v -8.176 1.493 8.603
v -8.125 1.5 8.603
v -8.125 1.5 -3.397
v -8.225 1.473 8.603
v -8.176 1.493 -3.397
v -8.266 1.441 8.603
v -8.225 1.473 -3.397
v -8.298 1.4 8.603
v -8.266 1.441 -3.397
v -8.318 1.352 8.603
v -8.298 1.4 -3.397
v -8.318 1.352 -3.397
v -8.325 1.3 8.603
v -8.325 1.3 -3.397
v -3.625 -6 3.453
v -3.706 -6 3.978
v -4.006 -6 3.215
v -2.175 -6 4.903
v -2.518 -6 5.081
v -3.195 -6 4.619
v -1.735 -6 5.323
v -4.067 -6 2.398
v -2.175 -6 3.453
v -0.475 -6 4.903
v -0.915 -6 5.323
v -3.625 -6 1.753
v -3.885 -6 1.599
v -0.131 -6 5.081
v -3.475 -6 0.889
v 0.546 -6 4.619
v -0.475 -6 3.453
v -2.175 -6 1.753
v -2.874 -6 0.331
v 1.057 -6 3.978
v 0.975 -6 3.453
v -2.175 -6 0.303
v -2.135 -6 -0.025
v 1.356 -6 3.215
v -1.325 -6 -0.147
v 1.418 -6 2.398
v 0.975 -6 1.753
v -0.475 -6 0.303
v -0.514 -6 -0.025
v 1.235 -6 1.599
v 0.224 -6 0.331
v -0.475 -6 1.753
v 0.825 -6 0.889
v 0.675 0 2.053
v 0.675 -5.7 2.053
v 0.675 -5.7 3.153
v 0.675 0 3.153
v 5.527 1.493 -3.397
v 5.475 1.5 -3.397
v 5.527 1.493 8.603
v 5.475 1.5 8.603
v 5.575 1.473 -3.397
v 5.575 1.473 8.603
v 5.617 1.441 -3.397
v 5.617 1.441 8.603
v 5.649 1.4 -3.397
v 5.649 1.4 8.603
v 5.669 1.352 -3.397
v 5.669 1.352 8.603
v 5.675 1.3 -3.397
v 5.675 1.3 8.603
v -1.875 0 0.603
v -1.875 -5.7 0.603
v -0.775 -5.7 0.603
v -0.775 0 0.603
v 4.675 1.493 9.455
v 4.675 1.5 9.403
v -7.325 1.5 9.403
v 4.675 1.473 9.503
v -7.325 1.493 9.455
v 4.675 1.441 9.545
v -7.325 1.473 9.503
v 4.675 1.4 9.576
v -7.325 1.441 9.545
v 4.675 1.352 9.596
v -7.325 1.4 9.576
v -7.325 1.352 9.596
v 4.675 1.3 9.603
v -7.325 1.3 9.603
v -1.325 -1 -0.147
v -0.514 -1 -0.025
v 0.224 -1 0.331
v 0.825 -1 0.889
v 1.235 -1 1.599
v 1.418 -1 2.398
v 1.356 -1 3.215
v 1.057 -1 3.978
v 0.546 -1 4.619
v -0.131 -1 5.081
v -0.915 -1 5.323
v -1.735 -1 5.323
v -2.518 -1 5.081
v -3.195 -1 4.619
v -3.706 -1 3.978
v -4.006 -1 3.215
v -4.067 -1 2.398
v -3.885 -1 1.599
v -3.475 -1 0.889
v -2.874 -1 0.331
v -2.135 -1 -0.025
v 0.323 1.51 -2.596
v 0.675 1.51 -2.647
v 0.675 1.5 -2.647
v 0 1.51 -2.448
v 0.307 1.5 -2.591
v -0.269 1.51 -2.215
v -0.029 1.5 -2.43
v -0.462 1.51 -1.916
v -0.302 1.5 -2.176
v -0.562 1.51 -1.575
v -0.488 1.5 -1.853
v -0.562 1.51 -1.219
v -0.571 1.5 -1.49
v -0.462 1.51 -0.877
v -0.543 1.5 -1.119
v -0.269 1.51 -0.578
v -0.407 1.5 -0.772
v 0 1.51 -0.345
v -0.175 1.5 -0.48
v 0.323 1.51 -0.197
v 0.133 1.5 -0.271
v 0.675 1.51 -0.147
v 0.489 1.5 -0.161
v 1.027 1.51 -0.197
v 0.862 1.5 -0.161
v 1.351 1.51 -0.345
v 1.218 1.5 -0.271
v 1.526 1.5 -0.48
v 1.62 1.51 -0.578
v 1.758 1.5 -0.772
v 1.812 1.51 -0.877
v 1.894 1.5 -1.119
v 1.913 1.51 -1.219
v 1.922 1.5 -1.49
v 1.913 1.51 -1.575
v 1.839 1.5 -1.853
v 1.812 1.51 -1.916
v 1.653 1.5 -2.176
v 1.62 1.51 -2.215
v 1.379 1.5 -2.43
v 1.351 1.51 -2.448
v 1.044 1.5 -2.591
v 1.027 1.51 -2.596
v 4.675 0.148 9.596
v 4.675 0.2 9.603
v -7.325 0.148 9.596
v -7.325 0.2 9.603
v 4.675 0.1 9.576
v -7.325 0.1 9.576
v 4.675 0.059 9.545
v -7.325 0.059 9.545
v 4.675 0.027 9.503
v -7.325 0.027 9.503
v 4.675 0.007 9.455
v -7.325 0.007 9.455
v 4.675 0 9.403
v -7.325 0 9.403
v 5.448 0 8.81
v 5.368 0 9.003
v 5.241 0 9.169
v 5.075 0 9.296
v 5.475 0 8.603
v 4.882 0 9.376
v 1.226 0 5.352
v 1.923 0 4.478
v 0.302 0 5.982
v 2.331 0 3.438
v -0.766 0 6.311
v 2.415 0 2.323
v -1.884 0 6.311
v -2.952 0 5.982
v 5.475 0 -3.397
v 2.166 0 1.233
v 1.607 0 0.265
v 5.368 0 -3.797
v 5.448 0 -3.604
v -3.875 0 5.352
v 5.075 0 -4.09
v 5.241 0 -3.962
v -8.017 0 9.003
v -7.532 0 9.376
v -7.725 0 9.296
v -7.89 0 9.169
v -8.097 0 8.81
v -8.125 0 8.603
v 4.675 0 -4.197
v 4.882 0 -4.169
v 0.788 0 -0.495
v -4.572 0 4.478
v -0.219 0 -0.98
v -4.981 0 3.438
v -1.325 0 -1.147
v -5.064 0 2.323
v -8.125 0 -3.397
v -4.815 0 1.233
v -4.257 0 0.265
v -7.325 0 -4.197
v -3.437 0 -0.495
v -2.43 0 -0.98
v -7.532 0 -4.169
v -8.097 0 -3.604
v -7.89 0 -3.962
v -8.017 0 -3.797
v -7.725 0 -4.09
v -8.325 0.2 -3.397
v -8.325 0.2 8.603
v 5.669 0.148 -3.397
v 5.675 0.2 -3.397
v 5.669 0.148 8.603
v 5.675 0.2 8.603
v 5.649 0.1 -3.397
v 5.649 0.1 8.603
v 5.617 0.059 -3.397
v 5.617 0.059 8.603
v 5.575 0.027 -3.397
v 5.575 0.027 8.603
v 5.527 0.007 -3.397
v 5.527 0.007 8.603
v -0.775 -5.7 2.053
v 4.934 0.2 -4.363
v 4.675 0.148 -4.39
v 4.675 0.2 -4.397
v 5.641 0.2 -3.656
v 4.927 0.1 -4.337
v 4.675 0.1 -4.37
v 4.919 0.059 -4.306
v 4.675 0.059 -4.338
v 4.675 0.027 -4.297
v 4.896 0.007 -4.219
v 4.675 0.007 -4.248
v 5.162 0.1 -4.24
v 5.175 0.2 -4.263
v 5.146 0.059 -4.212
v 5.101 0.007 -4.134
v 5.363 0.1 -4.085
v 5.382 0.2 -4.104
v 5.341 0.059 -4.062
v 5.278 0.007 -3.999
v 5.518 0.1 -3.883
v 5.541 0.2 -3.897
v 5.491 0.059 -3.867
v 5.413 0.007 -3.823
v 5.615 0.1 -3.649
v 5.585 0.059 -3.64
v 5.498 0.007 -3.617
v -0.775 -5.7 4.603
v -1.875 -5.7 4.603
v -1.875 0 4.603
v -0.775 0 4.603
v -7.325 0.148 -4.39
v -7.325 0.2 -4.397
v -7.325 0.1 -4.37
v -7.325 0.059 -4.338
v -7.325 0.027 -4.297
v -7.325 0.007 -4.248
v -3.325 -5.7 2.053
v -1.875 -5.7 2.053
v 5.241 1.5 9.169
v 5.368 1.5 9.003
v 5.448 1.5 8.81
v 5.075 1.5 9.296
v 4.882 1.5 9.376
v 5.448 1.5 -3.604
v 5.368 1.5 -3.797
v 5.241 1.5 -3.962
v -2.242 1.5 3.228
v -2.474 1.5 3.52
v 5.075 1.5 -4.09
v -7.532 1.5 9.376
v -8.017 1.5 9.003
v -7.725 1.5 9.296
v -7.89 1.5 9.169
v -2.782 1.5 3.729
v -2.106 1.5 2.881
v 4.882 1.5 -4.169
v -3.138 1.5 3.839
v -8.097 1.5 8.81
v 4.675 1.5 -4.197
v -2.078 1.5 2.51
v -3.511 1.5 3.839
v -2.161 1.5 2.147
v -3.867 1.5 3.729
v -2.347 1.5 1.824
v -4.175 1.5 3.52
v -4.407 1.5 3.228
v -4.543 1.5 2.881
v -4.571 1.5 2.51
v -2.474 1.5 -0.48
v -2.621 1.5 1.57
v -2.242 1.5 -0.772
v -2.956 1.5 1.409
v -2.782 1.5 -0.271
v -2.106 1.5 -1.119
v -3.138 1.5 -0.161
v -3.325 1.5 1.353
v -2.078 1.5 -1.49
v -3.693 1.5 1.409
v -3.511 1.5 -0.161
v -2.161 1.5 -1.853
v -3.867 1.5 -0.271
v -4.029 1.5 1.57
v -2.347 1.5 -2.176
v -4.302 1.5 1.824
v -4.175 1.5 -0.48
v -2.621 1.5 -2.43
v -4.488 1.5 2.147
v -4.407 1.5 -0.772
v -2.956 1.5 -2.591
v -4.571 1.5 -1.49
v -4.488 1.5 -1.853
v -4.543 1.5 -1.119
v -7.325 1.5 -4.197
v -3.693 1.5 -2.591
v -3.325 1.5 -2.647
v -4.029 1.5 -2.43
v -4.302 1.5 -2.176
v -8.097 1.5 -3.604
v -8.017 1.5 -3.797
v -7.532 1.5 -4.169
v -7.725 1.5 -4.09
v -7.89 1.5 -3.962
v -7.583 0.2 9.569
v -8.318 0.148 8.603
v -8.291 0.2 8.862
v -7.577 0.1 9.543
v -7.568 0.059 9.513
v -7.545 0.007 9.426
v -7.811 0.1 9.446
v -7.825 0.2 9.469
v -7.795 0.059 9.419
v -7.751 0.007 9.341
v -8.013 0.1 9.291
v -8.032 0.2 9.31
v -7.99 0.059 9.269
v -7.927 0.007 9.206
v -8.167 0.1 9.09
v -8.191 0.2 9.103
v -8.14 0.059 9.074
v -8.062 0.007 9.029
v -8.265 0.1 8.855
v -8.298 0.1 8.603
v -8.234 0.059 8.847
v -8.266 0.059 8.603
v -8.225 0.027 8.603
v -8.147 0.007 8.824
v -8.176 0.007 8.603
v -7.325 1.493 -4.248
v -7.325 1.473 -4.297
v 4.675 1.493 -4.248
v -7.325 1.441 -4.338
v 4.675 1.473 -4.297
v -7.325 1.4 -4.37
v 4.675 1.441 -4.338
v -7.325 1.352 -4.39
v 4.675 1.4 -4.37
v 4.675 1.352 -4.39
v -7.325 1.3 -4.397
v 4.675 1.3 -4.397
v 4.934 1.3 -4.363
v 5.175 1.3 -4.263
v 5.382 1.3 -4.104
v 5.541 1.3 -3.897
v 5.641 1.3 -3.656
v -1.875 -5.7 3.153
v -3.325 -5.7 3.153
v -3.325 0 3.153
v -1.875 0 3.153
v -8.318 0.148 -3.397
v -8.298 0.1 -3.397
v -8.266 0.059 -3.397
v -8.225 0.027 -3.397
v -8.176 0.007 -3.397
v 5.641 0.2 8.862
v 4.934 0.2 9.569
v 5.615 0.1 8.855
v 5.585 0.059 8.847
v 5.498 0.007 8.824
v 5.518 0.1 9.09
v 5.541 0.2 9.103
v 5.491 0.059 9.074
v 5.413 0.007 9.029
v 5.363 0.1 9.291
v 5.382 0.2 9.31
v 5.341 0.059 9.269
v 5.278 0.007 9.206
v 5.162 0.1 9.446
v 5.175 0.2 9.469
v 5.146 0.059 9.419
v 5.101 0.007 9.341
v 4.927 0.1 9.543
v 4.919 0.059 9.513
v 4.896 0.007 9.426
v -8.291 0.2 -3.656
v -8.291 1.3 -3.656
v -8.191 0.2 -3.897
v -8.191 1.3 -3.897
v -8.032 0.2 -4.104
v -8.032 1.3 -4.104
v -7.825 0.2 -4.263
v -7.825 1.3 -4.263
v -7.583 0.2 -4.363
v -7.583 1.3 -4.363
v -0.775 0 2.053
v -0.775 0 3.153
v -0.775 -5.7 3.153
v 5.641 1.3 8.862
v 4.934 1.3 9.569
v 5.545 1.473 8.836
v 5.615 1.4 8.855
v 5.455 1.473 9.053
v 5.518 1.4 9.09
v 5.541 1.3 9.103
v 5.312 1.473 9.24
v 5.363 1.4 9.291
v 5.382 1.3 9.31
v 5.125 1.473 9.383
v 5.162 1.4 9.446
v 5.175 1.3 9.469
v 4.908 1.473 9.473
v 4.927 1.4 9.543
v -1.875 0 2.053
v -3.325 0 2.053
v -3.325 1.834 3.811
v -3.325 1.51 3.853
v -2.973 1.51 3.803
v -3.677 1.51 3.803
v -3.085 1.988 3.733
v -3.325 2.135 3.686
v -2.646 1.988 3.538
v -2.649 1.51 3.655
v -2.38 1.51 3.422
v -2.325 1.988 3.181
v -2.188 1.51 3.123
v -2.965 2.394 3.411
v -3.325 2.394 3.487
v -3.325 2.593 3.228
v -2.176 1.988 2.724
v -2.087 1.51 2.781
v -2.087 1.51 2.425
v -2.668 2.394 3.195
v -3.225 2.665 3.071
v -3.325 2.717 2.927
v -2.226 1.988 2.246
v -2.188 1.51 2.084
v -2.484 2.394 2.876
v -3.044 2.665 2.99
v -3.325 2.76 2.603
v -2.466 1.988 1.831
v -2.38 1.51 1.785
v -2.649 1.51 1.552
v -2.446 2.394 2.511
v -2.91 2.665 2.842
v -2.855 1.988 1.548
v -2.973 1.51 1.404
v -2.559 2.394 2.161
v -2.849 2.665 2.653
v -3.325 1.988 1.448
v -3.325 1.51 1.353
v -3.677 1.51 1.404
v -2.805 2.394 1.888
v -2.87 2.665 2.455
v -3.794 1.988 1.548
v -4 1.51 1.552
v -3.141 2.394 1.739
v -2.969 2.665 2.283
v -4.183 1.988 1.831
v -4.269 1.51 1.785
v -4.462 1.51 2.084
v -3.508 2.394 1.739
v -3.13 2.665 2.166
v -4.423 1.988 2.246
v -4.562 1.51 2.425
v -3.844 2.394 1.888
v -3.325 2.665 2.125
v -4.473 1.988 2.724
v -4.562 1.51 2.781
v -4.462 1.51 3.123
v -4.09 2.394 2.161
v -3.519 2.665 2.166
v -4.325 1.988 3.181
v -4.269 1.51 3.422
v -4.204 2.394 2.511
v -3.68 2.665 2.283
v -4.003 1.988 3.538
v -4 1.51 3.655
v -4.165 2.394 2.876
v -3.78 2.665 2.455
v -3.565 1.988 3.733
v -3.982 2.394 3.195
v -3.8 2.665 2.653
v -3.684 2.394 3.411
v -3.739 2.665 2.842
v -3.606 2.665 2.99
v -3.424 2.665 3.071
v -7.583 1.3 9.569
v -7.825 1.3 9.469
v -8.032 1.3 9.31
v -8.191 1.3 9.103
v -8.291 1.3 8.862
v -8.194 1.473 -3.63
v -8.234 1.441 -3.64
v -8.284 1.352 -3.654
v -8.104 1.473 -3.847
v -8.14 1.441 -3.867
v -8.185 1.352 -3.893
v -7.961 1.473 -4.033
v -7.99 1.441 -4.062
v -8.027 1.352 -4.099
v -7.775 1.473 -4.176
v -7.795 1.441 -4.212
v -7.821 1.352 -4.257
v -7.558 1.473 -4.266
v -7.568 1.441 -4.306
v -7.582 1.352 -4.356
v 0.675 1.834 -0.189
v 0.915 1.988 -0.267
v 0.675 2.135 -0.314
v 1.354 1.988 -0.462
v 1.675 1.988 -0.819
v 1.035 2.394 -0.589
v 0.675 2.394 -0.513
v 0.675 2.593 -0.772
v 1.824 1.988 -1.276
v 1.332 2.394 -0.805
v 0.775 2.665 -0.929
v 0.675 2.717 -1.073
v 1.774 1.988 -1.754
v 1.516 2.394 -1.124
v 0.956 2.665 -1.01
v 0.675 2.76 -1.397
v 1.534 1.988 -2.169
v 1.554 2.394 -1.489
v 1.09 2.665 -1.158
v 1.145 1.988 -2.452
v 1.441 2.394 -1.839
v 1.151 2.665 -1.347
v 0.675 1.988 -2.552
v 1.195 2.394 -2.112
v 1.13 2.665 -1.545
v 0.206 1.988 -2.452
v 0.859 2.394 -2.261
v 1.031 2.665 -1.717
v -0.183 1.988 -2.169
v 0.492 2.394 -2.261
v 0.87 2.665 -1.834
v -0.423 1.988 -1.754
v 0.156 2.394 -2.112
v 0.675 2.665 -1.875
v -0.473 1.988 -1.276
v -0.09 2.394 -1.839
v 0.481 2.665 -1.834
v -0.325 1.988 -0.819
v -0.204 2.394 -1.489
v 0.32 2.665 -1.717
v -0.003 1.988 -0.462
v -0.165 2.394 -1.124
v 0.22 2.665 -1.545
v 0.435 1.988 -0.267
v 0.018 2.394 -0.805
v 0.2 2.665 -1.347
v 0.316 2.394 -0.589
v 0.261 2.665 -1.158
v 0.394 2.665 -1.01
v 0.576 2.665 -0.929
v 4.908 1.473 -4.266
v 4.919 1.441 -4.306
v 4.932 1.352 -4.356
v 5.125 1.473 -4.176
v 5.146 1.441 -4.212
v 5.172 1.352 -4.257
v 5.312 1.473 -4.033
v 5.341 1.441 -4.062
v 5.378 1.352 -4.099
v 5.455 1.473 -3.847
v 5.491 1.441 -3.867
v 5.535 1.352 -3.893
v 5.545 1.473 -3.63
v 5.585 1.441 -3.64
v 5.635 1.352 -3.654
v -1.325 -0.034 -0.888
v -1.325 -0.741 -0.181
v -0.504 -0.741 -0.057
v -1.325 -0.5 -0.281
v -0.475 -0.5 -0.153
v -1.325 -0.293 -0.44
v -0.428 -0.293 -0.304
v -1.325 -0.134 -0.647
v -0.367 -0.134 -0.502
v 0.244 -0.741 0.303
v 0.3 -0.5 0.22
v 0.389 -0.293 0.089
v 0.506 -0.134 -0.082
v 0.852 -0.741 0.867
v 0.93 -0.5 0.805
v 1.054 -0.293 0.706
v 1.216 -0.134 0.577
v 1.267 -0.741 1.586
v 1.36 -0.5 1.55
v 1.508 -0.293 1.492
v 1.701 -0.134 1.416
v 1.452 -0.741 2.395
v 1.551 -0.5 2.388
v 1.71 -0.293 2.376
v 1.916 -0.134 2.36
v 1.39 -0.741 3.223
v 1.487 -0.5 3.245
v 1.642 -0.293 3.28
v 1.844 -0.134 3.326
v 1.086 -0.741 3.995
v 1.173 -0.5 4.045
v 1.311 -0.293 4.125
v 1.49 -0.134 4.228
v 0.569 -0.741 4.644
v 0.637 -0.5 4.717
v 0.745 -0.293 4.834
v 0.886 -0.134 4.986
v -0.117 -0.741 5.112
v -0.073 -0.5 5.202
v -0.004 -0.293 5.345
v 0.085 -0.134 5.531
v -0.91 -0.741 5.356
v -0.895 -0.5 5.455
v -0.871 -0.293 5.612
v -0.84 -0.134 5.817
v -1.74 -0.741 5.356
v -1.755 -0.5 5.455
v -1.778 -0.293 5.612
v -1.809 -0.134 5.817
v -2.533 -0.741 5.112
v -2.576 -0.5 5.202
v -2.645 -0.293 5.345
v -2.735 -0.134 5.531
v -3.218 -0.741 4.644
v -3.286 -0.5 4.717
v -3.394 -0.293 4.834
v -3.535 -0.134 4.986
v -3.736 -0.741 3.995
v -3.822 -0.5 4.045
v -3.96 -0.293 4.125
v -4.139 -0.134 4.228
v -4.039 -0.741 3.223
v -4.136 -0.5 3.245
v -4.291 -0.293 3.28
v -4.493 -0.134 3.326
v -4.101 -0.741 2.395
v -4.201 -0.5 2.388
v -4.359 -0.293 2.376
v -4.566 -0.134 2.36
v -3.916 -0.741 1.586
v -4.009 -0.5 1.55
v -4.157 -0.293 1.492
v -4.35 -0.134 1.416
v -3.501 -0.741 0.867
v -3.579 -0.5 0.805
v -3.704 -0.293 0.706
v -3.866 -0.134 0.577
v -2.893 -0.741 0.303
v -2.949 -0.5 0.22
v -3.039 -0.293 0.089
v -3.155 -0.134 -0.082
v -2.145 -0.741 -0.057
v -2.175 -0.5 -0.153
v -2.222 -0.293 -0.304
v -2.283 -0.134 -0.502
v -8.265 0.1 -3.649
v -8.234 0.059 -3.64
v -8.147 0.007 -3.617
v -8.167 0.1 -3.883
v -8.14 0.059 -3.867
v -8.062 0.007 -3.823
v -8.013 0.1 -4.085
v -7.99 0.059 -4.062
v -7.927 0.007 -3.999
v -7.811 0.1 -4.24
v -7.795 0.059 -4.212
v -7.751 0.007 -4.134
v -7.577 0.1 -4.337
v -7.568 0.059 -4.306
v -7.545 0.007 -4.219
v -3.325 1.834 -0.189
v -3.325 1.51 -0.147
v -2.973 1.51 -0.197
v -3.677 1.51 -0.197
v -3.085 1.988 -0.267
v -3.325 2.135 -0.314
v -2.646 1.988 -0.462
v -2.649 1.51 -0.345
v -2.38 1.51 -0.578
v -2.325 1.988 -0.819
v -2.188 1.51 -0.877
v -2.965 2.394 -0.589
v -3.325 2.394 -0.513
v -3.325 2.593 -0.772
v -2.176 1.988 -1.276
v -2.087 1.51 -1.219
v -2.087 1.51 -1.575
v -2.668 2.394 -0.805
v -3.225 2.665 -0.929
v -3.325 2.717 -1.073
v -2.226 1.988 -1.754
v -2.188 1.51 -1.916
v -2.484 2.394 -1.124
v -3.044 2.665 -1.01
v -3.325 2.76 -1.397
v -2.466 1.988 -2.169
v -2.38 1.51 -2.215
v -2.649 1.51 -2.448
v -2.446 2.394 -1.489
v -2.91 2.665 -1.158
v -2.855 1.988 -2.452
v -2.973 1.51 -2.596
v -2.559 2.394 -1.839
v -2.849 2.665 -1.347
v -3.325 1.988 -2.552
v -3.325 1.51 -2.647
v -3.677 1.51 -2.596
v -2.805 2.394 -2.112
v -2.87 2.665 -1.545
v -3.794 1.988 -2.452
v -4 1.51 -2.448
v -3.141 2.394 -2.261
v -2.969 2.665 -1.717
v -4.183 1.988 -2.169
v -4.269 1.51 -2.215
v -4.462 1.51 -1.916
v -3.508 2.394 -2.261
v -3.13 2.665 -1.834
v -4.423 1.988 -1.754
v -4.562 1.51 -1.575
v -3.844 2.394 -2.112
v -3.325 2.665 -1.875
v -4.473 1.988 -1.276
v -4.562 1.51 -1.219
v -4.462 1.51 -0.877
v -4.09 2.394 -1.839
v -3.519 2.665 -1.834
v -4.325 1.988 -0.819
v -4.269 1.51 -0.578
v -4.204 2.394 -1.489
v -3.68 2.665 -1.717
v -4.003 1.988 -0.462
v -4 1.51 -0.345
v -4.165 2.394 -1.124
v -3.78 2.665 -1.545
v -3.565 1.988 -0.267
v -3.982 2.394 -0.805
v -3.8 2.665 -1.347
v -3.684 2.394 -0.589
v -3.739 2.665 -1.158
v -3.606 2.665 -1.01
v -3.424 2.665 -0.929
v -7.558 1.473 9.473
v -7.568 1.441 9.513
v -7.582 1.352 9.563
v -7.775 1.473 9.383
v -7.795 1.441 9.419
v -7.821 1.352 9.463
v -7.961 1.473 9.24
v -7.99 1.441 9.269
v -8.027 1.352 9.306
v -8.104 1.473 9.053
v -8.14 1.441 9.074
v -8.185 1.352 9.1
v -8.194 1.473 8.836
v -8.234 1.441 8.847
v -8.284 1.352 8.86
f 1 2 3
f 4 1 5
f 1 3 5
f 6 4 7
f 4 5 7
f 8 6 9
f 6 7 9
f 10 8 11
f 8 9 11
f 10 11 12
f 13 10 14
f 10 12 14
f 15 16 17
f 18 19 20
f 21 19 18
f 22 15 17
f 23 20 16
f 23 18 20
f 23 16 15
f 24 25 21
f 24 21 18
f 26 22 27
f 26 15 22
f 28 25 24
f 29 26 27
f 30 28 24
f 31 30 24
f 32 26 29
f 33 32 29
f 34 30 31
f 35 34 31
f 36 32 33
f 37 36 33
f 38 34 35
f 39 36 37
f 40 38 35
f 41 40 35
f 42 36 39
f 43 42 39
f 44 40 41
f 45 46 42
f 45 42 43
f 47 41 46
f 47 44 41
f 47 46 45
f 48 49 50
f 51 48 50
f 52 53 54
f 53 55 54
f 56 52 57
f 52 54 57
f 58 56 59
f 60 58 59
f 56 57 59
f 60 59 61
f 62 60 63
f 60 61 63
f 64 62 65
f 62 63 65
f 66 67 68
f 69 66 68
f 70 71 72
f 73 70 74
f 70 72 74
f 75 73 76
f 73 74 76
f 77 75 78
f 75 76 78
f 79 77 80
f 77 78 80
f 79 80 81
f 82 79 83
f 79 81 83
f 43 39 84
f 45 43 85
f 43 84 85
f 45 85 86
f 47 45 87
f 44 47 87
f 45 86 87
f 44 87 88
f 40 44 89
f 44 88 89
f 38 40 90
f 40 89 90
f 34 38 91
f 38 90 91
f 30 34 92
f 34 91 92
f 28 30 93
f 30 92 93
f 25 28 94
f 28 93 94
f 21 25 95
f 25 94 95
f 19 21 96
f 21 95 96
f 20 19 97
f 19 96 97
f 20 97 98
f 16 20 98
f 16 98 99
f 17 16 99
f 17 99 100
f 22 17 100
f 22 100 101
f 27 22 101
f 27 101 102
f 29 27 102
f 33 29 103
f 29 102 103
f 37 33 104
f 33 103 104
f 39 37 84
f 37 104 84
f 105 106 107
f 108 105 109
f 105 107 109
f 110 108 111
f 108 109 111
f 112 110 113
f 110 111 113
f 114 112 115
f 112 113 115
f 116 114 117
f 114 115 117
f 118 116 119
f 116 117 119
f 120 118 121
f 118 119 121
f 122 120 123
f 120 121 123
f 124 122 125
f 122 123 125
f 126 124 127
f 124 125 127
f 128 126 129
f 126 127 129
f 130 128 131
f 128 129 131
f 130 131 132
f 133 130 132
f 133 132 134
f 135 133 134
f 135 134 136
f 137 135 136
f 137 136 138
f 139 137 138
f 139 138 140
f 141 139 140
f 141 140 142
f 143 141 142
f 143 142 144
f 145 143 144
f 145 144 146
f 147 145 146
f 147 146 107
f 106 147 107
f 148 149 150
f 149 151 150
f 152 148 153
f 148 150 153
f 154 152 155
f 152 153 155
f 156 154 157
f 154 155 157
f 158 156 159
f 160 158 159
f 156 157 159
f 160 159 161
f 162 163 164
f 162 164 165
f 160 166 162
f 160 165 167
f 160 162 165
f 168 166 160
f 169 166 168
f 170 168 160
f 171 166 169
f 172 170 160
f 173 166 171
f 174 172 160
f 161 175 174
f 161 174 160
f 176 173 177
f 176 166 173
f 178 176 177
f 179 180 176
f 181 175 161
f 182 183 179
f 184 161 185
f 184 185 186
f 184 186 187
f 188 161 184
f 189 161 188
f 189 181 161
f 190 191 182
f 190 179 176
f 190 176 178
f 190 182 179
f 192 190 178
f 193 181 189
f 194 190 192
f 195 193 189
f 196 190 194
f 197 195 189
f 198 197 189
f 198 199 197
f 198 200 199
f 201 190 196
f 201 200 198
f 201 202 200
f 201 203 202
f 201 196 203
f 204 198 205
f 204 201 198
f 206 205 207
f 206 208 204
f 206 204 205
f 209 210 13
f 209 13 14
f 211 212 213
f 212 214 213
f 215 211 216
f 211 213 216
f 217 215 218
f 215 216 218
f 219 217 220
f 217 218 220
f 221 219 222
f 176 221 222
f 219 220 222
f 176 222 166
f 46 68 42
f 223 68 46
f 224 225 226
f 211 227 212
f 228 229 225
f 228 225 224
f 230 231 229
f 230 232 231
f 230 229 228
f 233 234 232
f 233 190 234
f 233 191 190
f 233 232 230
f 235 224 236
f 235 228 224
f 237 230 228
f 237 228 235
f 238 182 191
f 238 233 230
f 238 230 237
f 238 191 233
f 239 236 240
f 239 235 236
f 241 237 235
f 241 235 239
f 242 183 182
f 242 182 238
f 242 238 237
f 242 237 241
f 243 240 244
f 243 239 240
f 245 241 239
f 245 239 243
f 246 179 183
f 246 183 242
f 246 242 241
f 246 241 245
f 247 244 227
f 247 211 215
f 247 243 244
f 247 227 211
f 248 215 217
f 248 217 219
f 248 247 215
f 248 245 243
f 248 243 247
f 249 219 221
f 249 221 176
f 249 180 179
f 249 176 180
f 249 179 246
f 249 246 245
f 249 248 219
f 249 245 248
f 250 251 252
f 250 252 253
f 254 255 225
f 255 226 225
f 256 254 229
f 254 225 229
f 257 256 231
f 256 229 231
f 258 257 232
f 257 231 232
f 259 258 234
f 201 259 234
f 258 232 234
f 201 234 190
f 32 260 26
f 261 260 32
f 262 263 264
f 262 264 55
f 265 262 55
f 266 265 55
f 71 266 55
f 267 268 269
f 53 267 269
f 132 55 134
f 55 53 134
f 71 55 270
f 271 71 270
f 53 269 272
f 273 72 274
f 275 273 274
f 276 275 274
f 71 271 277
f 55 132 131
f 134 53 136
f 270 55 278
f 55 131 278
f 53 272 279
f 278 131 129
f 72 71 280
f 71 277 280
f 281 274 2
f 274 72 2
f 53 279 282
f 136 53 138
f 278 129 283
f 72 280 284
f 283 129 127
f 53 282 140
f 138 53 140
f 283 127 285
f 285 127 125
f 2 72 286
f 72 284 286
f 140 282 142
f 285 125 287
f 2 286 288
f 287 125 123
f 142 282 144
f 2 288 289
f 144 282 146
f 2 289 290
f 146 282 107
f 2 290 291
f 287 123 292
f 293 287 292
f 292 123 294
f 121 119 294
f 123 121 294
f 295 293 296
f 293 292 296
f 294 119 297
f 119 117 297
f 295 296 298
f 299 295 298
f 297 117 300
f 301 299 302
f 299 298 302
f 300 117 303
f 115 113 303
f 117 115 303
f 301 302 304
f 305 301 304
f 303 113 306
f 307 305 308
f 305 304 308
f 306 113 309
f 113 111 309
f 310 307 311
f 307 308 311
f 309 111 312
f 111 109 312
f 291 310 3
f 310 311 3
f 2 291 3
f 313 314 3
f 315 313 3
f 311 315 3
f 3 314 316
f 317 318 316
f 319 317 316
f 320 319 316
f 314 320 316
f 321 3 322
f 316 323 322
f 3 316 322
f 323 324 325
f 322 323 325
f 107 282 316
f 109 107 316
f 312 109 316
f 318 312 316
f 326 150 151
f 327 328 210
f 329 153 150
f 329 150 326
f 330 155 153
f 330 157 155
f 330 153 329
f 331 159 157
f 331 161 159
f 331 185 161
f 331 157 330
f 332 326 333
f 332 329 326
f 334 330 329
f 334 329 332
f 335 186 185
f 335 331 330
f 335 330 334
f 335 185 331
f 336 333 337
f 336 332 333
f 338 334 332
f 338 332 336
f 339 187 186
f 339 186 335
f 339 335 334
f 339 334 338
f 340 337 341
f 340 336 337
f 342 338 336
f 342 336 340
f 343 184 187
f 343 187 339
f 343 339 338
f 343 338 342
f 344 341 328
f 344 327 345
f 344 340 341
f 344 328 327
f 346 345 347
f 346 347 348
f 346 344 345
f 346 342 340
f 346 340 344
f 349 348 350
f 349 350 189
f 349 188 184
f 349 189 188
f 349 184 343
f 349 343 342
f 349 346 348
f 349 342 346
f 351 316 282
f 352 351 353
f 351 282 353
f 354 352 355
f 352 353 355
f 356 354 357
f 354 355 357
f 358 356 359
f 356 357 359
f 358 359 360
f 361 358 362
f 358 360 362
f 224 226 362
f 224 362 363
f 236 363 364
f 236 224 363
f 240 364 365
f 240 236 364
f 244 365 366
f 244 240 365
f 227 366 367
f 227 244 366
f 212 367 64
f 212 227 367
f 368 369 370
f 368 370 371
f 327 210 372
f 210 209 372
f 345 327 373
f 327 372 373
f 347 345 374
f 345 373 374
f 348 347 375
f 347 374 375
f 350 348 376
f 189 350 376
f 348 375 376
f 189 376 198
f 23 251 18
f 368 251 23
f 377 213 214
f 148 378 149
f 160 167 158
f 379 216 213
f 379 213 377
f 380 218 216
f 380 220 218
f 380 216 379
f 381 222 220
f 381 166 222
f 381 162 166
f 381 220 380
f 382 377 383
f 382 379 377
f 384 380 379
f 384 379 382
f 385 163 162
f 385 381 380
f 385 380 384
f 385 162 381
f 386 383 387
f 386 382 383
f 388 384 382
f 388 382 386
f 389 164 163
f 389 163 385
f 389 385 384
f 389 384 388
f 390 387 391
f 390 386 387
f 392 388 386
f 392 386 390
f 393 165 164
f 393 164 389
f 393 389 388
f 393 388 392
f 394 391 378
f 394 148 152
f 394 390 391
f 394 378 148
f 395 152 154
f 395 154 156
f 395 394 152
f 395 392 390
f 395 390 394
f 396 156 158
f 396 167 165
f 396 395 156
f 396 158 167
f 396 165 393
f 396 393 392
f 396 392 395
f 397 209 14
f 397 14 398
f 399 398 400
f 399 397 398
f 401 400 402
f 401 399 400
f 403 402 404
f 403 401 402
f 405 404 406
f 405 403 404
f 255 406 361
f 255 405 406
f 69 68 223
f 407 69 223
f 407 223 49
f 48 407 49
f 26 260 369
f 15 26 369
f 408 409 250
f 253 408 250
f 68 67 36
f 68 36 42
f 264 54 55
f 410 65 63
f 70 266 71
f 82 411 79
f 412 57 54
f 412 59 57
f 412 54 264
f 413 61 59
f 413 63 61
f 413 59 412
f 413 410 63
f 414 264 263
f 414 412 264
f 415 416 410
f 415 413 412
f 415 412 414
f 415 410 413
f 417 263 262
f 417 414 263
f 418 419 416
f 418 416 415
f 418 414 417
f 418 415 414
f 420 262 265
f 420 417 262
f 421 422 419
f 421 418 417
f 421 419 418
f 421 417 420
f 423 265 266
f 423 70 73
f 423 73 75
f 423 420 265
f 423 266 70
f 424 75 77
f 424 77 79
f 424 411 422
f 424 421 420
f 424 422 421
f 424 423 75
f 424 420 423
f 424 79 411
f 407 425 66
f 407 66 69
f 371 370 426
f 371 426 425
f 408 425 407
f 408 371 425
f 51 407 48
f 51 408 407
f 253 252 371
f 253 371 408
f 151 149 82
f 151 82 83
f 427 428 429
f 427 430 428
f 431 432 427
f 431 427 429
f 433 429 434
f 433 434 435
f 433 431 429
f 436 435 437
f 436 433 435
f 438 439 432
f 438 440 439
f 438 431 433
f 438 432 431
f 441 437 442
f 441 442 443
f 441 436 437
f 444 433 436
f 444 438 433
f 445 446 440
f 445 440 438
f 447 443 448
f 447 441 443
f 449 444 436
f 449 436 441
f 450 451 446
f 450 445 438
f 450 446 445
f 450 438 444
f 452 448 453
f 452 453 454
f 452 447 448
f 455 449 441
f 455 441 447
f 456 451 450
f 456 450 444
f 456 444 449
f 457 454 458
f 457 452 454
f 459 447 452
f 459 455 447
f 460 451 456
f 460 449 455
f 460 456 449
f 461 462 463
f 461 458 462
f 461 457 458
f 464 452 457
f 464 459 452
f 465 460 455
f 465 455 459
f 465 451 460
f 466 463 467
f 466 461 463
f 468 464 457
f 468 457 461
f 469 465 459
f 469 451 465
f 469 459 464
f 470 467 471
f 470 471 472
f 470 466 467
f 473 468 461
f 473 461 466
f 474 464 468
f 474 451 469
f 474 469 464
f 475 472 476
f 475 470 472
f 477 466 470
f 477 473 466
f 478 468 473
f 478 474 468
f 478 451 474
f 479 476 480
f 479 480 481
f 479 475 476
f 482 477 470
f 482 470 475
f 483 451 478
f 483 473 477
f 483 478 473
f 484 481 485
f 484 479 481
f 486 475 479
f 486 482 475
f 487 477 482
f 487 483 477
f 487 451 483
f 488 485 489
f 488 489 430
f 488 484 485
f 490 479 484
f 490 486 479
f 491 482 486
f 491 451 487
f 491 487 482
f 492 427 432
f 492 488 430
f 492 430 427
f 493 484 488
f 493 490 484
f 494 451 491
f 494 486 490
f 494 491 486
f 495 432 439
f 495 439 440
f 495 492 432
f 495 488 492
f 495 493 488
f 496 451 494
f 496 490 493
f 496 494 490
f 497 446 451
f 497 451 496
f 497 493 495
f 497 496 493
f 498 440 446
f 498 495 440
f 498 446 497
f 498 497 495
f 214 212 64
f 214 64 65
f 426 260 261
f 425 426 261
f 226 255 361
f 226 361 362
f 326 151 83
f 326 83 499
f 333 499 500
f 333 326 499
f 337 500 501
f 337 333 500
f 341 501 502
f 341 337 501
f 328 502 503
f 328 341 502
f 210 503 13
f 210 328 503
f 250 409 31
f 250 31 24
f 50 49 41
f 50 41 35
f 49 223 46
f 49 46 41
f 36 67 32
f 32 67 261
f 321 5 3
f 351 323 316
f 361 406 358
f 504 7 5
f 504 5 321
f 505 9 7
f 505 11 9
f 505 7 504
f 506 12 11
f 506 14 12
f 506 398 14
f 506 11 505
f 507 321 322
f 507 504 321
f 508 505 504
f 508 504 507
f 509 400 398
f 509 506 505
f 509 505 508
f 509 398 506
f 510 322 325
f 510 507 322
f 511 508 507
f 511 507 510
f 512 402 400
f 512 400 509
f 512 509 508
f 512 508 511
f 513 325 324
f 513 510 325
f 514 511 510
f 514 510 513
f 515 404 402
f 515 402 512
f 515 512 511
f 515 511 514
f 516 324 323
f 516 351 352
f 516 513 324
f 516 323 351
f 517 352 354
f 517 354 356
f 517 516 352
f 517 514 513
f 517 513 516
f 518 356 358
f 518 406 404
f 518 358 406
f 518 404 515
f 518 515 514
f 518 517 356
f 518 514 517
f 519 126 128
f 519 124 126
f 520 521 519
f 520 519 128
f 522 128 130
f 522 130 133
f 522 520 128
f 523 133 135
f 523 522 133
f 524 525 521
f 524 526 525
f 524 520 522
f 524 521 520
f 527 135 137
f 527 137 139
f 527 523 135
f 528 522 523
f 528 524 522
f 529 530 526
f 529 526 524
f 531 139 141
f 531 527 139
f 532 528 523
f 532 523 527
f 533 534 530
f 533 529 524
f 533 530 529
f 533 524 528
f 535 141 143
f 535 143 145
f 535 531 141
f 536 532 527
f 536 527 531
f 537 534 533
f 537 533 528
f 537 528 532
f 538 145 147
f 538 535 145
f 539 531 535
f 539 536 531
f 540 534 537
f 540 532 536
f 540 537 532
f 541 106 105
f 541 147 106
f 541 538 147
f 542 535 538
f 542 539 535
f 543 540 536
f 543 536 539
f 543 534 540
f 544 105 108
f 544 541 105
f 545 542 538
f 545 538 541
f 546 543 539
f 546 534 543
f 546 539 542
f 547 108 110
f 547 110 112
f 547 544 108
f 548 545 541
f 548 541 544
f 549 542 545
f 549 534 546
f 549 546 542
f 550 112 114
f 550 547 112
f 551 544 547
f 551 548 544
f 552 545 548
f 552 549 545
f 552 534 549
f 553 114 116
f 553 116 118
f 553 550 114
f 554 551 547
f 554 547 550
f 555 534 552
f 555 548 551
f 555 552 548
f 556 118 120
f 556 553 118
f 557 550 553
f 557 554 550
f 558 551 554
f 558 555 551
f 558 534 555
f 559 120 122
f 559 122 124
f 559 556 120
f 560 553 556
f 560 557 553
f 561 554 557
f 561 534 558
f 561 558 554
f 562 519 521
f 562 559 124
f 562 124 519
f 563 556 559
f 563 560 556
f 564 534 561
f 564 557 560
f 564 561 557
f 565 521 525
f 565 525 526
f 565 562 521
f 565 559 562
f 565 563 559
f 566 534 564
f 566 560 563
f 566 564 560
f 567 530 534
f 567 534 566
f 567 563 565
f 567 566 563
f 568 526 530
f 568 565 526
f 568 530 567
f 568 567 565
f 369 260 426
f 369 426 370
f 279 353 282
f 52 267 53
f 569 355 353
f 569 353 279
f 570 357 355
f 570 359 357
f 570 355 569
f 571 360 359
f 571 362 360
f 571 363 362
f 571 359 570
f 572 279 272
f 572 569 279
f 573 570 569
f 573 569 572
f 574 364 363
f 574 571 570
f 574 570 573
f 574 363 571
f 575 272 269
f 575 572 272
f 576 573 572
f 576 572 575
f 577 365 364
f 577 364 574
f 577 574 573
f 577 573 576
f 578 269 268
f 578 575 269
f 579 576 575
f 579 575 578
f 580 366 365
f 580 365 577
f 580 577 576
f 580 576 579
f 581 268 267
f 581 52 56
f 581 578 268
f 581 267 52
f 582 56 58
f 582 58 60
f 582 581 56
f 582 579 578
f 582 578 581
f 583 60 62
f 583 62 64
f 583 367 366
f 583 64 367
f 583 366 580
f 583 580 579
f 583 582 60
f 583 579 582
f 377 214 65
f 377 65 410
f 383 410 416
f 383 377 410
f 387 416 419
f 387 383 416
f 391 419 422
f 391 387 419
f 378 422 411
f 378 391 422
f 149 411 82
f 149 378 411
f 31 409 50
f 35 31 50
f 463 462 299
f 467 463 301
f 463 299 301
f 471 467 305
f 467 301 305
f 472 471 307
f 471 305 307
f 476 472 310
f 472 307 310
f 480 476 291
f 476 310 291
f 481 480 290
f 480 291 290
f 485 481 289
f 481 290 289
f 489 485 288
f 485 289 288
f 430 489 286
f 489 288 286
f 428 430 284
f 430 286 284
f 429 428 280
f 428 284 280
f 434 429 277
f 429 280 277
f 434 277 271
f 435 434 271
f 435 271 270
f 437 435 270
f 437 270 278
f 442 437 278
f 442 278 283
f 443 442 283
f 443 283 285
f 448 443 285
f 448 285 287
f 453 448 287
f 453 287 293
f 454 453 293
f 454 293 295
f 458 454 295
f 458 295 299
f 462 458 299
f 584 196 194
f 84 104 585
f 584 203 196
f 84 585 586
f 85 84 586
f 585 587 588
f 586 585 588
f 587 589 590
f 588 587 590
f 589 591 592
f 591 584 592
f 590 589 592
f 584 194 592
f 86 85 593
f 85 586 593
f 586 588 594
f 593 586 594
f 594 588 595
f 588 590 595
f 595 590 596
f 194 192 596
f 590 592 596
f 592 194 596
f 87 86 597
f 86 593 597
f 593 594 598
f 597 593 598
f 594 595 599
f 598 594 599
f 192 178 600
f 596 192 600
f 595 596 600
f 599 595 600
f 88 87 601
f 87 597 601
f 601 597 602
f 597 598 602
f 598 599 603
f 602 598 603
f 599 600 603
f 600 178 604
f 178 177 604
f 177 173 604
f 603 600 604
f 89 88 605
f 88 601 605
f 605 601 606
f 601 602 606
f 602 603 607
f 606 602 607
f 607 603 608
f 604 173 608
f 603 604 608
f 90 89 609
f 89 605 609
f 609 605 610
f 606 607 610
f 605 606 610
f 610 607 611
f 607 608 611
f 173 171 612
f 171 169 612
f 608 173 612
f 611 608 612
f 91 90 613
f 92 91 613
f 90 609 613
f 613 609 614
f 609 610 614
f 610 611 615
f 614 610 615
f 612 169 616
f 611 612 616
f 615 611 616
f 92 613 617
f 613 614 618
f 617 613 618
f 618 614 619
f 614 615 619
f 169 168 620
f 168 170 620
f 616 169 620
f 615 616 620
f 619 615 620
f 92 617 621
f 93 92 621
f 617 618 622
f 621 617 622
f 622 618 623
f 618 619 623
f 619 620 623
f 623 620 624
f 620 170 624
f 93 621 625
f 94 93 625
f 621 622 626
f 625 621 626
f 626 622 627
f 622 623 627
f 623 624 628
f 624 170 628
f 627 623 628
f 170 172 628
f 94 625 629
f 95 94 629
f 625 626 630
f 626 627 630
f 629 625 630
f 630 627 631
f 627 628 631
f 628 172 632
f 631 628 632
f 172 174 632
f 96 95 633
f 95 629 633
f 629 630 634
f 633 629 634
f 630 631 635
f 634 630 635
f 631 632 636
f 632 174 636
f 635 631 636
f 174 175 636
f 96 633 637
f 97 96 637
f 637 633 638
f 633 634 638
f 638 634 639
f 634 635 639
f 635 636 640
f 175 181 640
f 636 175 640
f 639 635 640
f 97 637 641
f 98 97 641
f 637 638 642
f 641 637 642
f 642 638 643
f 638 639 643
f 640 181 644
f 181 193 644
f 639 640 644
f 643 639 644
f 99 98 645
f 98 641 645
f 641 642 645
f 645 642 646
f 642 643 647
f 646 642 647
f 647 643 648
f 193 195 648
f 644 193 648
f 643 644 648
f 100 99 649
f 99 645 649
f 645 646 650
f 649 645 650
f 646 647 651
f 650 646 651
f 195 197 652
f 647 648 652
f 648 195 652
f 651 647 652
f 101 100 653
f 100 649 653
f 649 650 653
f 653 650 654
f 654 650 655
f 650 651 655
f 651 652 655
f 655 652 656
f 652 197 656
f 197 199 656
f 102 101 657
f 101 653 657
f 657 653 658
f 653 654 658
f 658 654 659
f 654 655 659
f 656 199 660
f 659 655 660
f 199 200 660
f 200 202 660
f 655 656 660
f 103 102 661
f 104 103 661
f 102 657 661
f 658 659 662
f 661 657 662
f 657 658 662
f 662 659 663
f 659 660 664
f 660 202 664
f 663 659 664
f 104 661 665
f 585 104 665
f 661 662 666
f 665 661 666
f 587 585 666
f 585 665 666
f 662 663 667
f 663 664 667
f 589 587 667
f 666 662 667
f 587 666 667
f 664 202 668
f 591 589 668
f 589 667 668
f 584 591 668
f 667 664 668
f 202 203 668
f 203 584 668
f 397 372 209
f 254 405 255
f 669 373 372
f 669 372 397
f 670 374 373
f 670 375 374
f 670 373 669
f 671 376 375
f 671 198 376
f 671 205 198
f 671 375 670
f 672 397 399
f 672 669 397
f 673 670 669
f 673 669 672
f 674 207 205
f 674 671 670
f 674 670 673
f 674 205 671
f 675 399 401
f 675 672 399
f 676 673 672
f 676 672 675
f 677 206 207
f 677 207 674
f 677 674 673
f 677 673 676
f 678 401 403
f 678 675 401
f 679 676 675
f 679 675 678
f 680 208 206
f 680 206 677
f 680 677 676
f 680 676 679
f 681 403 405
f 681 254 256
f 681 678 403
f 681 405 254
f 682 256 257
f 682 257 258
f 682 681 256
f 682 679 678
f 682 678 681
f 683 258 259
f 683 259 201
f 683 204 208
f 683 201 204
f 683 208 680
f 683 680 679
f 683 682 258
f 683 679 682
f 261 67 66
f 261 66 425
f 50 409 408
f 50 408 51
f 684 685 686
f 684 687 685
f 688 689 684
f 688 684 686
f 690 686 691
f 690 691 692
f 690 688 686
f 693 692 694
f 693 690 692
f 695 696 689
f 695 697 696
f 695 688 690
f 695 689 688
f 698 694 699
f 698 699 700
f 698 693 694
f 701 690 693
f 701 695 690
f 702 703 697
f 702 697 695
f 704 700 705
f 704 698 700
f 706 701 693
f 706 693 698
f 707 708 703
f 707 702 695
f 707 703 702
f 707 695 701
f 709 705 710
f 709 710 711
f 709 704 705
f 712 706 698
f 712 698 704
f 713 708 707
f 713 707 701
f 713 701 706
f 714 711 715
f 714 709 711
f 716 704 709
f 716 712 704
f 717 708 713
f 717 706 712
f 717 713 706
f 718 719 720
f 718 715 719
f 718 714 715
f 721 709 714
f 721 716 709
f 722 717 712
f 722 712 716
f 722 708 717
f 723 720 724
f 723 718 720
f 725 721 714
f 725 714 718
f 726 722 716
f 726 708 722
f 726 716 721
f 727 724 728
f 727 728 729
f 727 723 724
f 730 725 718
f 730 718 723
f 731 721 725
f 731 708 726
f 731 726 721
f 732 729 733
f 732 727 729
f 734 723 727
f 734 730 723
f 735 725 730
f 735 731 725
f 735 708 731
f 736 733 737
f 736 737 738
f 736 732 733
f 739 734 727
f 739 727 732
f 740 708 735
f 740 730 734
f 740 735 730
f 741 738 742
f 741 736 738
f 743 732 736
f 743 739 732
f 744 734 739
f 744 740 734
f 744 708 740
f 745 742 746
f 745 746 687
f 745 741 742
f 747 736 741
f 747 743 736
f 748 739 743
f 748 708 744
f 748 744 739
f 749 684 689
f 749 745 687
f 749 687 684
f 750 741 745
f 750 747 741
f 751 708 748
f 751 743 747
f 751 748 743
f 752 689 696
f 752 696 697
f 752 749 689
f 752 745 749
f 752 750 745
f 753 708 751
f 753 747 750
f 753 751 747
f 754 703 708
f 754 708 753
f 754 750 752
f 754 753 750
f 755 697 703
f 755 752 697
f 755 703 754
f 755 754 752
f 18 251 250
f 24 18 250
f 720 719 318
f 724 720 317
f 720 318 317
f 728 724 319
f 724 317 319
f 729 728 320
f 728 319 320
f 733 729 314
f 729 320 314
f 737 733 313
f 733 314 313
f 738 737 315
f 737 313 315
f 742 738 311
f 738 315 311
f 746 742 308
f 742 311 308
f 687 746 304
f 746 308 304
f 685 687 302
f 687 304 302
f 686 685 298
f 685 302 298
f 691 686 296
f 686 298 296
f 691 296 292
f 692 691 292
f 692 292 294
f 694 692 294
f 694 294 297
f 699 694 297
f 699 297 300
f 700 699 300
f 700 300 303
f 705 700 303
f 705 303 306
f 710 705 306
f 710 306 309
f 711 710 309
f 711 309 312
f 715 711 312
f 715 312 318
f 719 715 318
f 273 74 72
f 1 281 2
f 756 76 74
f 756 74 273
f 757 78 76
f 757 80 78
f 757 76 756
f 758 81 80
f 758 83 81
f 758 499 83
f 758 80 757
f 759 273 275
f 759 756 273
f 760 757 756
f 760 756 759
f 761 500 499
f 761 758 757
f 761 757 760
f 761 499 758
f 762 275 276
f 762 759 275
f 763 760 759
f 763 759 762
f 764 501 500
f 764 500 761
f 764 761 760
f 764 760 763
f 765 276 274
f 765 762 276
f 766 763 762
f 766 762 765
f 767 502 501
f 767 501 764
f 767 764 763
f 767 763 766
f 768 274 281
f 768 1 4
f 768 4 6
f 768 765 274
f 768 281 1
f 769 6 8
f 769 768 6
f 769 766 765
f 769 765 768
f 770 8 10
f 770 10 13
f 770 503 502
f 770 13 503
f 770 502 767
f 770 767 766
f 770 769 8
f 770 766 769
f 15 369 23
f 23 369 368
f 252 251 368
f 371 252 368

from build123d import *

# Parameters (mm, degrees)
BOSS_EXTRUDE1_DEPTH = 1.5
SKETCH2_R           = 2.75
BOSS_EXTRUDE2_DEPTH = 6
SKETCH3_W           = 1.1
SKETCH3_H           = 1.45
SKETCH3_W_2         = 1.45
SKETCH3_H_2         = 1.1
CUT_EXTRUDE1_DEPTH  = 6
CHAMFER1_SIZE       = 0.3
FILLET1_R           = 1
SKETCH4_R           = 1.25
BOSS_EXTRUDE3_DEPTH = 0.01
DOME1_FACE_RADIUS   = 1.25
DOME1_HEIGHT        = 1.25
DOME2_FACE_RADIUS   = 1.25
DOME2_HEIGHT        = 1.25
DOME3_FACE_RADIUS   = 1.25
DOME3_HEIGHT        = 1.25
FILLET3_R           = 0.2


with BuildPart() as part:
    # Sketch1 → Boss-Extrude1 (new body)
    with BuildSketch(Plane(origin=(0, 0, 0), x_dir=(1, 0, 0), z_dir=(0, 1, 0))):
        with BuildLine():
            Line((-7.324675649, 4.396717546), (4.675324351, 4.396717546))
            ThreePointArc((4.675324351, 4.396717546), (5.382431132, 4.103824327), (5.675324351, 3.396717546))
            Line((5.675324351, 3.396717546), (5.675324351, -8.603282454))
            ThreePointArc((5.675324351, -8.603282454), (5.382431132, -9.310389235), (4.675324351, -9.603282454))
            Line((4.675324351, -9.603282454), (-7.324675649, -9.603282454))
            ThreePointArc((-7.324675649, -9.603282454), (-8.03178243, -9.310389235), (-8.324675649, -8.603282454))
            Line((-8.324675649, -8.603282454), (-8.324675649, 3.396717546))
            ThreePointArc((-8.324675649, 3.396717546), (-8.03178243, 4.103824327), (-7.324675649, 4.396717546))
        make_face()
    extrude(amount=BOSS_EXTRUDE1_DEPTH)

    # Sketch2 → Boss-Extrude2 (add)
    with BuildSketch(Plane.XZ):
        with Locations(Location((-1.324675649, 2.603282454, 0), (0, 0, 270))):
            Circle(SKETCH2_R)
    extrude(amount=BOSS_EXTRUDE2_DEPTH)

    # Sketch3 → Cut-Extrude1 (cut)
    with BuildSketch(Plane.XZ.offset(6)):
        with Locations((-1.324675649, 3.878282454)):
            Rectangle(SKETCH3_W, SKETCH3_H)
        with Locations((-0.049675649, 2.603282454)):
            Rectangle(SKETCH3_W_2, SKETCH3_H_2)
        with Locations((-1.324675649, 2.603282454)):
            Rectangle(SKETCH3_W, SKETCH3_H_2)
        with Locations((-2.599675649, 2.603282454)):
            Rectangle(SKETCH3_W_2, SKETCH3_H_2)
        with Locations((-1.324675649, 1.328282454)):
            Rectangle(SKETCH3_W, SKETCH3_H)
    extrude(amount=-CUT_EXTRUDE1_DEPTH, mode=Mode.SUBTRACT)

    # Chamfer1
    chamfer1_edges = [part.edges().sort_by_distance(p)[0] for p in [
        (-0.774675649, -6, 3.878282454),
        (-0.049675649, -6, 3.153282454),
        (0.675324351, -6, 2.603282454),
        (-0.774675649, -6, 1.328282454),
        (-2.599675649, -6, 3.153282454),
        (-1.324675649, -6, 4.603282454),
        (-1.874675649, -6, 3.878282454),
        (-3.324675649, -6, 2.603282454),
        (-2.599675649, -6, 2.053282454),
        (-1.874675649, -6, 1.328282454),
        (-1.324675649, -6, 0.603282454),
        (-0.049675649, -6, 2.053282454),
    ]]
    chamfer(chamfer1_edges, length=CHAMFER1_SIZE)

    # Fillet1
    fillet1_edges = [part.edges().sort_by_distance(p)[0] for p in [
        (-1.324675649, 0, 5.353282454),
    ]]
    fillet(fillet1_edges, radius=FILLET1_R)

    # Sketch4 → Boss-Extrude3 (add)
    with BuildSketch(Plane(origin=(0, 1.5, 0), x_dir=(1, 0, 0), z_dir=(0, 1, 0))):
        with Locations(Location((-3.324675649, 1.396717546, 0), (0, 0, 90))):
            Circle(SKETCH4_R)
        with Locations(Location((-3.324675649, -2.603282454, 0), (0, 0, 90))):
            Circle(SKETCH4_R)
        with Locations(Location((0.675324351, 1.396717546, 0), (0, 0, 90))):
            Circle(SKETCH4_R)
    extrude(amount=BOSS_EXTRUDE3_DEPTH)

    # Dome1: a dome of height H over a round flat face of radius A is a cap of a sphere of radius (A * A + H * H) / (2 * H)
    dome1_r = (DOME1_FACE_RADIUS * DOME1_FACE_RADIUS + DOME1_HEIGHT * DOME1_HEIGHT) / (2 * DOME1_HEIGHT)
    dome1_base = Plane((-3.324675649, 1.51, -1.396717546), z_dir=(0, 1, 0))
    with Locations(dome1_base.offset(DOME1_HEIGHT - dome1_r)):
        dome1_ball = Sphere(dome1_r, mode=Mode.PRIVATE)
    add(split(dome1_ball, bisect_by=dome1_base, keep=Keep.TOP, mode=Mode.PRIVATE))

    # Dome2: a dome of height H over a round flat face of radius A is a cap of a sphere of radius (A * A + H * H) / (2 * H)
    dome2_r = (DOME2_FACE_RADIUS * DOME2_FACE_RADIUS + DOME2_HEIGHT * DOME2_HEIGHT) / (2 * DOME2_HEIGHT)
    dome2_base = Plane((0.675324351, 1.51, -1.396717546), z_dir=(0, 1, 0))
    with Locations(dome2_base.offset(DOME2_HEIGHT - dome2_r)):
        dome2_ball = Sphere(dome2_r, mode=Mode.PRIVATE)
    add(split(dome2_ball, bisect_by=dome2_base, keep=Keep.TOP, mode=Mode.PRIVATE))

    # Dome3: a dome of height H over a round flat face of radius A is a cap of a sphere of radius (A * A + H * H) / (2 * H)
    dome3_r = (DOME3_FACE_RADIUS * DOME3_FACE_RADIUS + DOME3_HEIGHT * DOME3_HEIGHT) / (2 * DOME3_HEIGHT)
    dome3_base = Plane((-3.324675649, 1.51, 2.603282454), z_dir=(0, 1, 0))
    with Locations(dome3_base.offset(DOME3_HEIGHT - dome3_r)):
        dome3_ball = Sphere(dome3_r, mode=Mode.PRIVATE)
    add(split(dome3_ball, bisect_by=dome3_base, keep=Keep.TOP, mode=Mode.PRIVATE))

    # Fillet3
    fillet3_edges = [part.edges().sort_by_distance(p)[0] for p in [
        (5.382431132, 1.5, 9.310389235),
        (-1.324675649, 0, 9.603282454),
        (-8.03178243, 0, 9.310389235),
        (5.675324351, 1.5, 2.603282454),
        (5.382431132, 1.5, -4.103824327),
        (-1.324675649, 1.5, -4.396717546),
        (-8.03178243, 1.5, -4.103824327),
        (-8.324675649, 1.5, 2.603282454),
        (-8.03178243, 1.5, 9.310389235),
        (-1.324675649, 1.5, 9.603282454),
        (-8.324675649, 0, 2.603282454),
        (-8.03178243, 0, -4.103824327),
        (-1.324675649, 0, -4.396717546),
        (5.382431132, 0, -4.103824327),
        (5.675324351, 0, 2.603282454),
        (5.382431132, 0, 9.310389235),
    ]]
    fillet(fillet3_edges, radius=FILLET3_R)


solid = part.part
